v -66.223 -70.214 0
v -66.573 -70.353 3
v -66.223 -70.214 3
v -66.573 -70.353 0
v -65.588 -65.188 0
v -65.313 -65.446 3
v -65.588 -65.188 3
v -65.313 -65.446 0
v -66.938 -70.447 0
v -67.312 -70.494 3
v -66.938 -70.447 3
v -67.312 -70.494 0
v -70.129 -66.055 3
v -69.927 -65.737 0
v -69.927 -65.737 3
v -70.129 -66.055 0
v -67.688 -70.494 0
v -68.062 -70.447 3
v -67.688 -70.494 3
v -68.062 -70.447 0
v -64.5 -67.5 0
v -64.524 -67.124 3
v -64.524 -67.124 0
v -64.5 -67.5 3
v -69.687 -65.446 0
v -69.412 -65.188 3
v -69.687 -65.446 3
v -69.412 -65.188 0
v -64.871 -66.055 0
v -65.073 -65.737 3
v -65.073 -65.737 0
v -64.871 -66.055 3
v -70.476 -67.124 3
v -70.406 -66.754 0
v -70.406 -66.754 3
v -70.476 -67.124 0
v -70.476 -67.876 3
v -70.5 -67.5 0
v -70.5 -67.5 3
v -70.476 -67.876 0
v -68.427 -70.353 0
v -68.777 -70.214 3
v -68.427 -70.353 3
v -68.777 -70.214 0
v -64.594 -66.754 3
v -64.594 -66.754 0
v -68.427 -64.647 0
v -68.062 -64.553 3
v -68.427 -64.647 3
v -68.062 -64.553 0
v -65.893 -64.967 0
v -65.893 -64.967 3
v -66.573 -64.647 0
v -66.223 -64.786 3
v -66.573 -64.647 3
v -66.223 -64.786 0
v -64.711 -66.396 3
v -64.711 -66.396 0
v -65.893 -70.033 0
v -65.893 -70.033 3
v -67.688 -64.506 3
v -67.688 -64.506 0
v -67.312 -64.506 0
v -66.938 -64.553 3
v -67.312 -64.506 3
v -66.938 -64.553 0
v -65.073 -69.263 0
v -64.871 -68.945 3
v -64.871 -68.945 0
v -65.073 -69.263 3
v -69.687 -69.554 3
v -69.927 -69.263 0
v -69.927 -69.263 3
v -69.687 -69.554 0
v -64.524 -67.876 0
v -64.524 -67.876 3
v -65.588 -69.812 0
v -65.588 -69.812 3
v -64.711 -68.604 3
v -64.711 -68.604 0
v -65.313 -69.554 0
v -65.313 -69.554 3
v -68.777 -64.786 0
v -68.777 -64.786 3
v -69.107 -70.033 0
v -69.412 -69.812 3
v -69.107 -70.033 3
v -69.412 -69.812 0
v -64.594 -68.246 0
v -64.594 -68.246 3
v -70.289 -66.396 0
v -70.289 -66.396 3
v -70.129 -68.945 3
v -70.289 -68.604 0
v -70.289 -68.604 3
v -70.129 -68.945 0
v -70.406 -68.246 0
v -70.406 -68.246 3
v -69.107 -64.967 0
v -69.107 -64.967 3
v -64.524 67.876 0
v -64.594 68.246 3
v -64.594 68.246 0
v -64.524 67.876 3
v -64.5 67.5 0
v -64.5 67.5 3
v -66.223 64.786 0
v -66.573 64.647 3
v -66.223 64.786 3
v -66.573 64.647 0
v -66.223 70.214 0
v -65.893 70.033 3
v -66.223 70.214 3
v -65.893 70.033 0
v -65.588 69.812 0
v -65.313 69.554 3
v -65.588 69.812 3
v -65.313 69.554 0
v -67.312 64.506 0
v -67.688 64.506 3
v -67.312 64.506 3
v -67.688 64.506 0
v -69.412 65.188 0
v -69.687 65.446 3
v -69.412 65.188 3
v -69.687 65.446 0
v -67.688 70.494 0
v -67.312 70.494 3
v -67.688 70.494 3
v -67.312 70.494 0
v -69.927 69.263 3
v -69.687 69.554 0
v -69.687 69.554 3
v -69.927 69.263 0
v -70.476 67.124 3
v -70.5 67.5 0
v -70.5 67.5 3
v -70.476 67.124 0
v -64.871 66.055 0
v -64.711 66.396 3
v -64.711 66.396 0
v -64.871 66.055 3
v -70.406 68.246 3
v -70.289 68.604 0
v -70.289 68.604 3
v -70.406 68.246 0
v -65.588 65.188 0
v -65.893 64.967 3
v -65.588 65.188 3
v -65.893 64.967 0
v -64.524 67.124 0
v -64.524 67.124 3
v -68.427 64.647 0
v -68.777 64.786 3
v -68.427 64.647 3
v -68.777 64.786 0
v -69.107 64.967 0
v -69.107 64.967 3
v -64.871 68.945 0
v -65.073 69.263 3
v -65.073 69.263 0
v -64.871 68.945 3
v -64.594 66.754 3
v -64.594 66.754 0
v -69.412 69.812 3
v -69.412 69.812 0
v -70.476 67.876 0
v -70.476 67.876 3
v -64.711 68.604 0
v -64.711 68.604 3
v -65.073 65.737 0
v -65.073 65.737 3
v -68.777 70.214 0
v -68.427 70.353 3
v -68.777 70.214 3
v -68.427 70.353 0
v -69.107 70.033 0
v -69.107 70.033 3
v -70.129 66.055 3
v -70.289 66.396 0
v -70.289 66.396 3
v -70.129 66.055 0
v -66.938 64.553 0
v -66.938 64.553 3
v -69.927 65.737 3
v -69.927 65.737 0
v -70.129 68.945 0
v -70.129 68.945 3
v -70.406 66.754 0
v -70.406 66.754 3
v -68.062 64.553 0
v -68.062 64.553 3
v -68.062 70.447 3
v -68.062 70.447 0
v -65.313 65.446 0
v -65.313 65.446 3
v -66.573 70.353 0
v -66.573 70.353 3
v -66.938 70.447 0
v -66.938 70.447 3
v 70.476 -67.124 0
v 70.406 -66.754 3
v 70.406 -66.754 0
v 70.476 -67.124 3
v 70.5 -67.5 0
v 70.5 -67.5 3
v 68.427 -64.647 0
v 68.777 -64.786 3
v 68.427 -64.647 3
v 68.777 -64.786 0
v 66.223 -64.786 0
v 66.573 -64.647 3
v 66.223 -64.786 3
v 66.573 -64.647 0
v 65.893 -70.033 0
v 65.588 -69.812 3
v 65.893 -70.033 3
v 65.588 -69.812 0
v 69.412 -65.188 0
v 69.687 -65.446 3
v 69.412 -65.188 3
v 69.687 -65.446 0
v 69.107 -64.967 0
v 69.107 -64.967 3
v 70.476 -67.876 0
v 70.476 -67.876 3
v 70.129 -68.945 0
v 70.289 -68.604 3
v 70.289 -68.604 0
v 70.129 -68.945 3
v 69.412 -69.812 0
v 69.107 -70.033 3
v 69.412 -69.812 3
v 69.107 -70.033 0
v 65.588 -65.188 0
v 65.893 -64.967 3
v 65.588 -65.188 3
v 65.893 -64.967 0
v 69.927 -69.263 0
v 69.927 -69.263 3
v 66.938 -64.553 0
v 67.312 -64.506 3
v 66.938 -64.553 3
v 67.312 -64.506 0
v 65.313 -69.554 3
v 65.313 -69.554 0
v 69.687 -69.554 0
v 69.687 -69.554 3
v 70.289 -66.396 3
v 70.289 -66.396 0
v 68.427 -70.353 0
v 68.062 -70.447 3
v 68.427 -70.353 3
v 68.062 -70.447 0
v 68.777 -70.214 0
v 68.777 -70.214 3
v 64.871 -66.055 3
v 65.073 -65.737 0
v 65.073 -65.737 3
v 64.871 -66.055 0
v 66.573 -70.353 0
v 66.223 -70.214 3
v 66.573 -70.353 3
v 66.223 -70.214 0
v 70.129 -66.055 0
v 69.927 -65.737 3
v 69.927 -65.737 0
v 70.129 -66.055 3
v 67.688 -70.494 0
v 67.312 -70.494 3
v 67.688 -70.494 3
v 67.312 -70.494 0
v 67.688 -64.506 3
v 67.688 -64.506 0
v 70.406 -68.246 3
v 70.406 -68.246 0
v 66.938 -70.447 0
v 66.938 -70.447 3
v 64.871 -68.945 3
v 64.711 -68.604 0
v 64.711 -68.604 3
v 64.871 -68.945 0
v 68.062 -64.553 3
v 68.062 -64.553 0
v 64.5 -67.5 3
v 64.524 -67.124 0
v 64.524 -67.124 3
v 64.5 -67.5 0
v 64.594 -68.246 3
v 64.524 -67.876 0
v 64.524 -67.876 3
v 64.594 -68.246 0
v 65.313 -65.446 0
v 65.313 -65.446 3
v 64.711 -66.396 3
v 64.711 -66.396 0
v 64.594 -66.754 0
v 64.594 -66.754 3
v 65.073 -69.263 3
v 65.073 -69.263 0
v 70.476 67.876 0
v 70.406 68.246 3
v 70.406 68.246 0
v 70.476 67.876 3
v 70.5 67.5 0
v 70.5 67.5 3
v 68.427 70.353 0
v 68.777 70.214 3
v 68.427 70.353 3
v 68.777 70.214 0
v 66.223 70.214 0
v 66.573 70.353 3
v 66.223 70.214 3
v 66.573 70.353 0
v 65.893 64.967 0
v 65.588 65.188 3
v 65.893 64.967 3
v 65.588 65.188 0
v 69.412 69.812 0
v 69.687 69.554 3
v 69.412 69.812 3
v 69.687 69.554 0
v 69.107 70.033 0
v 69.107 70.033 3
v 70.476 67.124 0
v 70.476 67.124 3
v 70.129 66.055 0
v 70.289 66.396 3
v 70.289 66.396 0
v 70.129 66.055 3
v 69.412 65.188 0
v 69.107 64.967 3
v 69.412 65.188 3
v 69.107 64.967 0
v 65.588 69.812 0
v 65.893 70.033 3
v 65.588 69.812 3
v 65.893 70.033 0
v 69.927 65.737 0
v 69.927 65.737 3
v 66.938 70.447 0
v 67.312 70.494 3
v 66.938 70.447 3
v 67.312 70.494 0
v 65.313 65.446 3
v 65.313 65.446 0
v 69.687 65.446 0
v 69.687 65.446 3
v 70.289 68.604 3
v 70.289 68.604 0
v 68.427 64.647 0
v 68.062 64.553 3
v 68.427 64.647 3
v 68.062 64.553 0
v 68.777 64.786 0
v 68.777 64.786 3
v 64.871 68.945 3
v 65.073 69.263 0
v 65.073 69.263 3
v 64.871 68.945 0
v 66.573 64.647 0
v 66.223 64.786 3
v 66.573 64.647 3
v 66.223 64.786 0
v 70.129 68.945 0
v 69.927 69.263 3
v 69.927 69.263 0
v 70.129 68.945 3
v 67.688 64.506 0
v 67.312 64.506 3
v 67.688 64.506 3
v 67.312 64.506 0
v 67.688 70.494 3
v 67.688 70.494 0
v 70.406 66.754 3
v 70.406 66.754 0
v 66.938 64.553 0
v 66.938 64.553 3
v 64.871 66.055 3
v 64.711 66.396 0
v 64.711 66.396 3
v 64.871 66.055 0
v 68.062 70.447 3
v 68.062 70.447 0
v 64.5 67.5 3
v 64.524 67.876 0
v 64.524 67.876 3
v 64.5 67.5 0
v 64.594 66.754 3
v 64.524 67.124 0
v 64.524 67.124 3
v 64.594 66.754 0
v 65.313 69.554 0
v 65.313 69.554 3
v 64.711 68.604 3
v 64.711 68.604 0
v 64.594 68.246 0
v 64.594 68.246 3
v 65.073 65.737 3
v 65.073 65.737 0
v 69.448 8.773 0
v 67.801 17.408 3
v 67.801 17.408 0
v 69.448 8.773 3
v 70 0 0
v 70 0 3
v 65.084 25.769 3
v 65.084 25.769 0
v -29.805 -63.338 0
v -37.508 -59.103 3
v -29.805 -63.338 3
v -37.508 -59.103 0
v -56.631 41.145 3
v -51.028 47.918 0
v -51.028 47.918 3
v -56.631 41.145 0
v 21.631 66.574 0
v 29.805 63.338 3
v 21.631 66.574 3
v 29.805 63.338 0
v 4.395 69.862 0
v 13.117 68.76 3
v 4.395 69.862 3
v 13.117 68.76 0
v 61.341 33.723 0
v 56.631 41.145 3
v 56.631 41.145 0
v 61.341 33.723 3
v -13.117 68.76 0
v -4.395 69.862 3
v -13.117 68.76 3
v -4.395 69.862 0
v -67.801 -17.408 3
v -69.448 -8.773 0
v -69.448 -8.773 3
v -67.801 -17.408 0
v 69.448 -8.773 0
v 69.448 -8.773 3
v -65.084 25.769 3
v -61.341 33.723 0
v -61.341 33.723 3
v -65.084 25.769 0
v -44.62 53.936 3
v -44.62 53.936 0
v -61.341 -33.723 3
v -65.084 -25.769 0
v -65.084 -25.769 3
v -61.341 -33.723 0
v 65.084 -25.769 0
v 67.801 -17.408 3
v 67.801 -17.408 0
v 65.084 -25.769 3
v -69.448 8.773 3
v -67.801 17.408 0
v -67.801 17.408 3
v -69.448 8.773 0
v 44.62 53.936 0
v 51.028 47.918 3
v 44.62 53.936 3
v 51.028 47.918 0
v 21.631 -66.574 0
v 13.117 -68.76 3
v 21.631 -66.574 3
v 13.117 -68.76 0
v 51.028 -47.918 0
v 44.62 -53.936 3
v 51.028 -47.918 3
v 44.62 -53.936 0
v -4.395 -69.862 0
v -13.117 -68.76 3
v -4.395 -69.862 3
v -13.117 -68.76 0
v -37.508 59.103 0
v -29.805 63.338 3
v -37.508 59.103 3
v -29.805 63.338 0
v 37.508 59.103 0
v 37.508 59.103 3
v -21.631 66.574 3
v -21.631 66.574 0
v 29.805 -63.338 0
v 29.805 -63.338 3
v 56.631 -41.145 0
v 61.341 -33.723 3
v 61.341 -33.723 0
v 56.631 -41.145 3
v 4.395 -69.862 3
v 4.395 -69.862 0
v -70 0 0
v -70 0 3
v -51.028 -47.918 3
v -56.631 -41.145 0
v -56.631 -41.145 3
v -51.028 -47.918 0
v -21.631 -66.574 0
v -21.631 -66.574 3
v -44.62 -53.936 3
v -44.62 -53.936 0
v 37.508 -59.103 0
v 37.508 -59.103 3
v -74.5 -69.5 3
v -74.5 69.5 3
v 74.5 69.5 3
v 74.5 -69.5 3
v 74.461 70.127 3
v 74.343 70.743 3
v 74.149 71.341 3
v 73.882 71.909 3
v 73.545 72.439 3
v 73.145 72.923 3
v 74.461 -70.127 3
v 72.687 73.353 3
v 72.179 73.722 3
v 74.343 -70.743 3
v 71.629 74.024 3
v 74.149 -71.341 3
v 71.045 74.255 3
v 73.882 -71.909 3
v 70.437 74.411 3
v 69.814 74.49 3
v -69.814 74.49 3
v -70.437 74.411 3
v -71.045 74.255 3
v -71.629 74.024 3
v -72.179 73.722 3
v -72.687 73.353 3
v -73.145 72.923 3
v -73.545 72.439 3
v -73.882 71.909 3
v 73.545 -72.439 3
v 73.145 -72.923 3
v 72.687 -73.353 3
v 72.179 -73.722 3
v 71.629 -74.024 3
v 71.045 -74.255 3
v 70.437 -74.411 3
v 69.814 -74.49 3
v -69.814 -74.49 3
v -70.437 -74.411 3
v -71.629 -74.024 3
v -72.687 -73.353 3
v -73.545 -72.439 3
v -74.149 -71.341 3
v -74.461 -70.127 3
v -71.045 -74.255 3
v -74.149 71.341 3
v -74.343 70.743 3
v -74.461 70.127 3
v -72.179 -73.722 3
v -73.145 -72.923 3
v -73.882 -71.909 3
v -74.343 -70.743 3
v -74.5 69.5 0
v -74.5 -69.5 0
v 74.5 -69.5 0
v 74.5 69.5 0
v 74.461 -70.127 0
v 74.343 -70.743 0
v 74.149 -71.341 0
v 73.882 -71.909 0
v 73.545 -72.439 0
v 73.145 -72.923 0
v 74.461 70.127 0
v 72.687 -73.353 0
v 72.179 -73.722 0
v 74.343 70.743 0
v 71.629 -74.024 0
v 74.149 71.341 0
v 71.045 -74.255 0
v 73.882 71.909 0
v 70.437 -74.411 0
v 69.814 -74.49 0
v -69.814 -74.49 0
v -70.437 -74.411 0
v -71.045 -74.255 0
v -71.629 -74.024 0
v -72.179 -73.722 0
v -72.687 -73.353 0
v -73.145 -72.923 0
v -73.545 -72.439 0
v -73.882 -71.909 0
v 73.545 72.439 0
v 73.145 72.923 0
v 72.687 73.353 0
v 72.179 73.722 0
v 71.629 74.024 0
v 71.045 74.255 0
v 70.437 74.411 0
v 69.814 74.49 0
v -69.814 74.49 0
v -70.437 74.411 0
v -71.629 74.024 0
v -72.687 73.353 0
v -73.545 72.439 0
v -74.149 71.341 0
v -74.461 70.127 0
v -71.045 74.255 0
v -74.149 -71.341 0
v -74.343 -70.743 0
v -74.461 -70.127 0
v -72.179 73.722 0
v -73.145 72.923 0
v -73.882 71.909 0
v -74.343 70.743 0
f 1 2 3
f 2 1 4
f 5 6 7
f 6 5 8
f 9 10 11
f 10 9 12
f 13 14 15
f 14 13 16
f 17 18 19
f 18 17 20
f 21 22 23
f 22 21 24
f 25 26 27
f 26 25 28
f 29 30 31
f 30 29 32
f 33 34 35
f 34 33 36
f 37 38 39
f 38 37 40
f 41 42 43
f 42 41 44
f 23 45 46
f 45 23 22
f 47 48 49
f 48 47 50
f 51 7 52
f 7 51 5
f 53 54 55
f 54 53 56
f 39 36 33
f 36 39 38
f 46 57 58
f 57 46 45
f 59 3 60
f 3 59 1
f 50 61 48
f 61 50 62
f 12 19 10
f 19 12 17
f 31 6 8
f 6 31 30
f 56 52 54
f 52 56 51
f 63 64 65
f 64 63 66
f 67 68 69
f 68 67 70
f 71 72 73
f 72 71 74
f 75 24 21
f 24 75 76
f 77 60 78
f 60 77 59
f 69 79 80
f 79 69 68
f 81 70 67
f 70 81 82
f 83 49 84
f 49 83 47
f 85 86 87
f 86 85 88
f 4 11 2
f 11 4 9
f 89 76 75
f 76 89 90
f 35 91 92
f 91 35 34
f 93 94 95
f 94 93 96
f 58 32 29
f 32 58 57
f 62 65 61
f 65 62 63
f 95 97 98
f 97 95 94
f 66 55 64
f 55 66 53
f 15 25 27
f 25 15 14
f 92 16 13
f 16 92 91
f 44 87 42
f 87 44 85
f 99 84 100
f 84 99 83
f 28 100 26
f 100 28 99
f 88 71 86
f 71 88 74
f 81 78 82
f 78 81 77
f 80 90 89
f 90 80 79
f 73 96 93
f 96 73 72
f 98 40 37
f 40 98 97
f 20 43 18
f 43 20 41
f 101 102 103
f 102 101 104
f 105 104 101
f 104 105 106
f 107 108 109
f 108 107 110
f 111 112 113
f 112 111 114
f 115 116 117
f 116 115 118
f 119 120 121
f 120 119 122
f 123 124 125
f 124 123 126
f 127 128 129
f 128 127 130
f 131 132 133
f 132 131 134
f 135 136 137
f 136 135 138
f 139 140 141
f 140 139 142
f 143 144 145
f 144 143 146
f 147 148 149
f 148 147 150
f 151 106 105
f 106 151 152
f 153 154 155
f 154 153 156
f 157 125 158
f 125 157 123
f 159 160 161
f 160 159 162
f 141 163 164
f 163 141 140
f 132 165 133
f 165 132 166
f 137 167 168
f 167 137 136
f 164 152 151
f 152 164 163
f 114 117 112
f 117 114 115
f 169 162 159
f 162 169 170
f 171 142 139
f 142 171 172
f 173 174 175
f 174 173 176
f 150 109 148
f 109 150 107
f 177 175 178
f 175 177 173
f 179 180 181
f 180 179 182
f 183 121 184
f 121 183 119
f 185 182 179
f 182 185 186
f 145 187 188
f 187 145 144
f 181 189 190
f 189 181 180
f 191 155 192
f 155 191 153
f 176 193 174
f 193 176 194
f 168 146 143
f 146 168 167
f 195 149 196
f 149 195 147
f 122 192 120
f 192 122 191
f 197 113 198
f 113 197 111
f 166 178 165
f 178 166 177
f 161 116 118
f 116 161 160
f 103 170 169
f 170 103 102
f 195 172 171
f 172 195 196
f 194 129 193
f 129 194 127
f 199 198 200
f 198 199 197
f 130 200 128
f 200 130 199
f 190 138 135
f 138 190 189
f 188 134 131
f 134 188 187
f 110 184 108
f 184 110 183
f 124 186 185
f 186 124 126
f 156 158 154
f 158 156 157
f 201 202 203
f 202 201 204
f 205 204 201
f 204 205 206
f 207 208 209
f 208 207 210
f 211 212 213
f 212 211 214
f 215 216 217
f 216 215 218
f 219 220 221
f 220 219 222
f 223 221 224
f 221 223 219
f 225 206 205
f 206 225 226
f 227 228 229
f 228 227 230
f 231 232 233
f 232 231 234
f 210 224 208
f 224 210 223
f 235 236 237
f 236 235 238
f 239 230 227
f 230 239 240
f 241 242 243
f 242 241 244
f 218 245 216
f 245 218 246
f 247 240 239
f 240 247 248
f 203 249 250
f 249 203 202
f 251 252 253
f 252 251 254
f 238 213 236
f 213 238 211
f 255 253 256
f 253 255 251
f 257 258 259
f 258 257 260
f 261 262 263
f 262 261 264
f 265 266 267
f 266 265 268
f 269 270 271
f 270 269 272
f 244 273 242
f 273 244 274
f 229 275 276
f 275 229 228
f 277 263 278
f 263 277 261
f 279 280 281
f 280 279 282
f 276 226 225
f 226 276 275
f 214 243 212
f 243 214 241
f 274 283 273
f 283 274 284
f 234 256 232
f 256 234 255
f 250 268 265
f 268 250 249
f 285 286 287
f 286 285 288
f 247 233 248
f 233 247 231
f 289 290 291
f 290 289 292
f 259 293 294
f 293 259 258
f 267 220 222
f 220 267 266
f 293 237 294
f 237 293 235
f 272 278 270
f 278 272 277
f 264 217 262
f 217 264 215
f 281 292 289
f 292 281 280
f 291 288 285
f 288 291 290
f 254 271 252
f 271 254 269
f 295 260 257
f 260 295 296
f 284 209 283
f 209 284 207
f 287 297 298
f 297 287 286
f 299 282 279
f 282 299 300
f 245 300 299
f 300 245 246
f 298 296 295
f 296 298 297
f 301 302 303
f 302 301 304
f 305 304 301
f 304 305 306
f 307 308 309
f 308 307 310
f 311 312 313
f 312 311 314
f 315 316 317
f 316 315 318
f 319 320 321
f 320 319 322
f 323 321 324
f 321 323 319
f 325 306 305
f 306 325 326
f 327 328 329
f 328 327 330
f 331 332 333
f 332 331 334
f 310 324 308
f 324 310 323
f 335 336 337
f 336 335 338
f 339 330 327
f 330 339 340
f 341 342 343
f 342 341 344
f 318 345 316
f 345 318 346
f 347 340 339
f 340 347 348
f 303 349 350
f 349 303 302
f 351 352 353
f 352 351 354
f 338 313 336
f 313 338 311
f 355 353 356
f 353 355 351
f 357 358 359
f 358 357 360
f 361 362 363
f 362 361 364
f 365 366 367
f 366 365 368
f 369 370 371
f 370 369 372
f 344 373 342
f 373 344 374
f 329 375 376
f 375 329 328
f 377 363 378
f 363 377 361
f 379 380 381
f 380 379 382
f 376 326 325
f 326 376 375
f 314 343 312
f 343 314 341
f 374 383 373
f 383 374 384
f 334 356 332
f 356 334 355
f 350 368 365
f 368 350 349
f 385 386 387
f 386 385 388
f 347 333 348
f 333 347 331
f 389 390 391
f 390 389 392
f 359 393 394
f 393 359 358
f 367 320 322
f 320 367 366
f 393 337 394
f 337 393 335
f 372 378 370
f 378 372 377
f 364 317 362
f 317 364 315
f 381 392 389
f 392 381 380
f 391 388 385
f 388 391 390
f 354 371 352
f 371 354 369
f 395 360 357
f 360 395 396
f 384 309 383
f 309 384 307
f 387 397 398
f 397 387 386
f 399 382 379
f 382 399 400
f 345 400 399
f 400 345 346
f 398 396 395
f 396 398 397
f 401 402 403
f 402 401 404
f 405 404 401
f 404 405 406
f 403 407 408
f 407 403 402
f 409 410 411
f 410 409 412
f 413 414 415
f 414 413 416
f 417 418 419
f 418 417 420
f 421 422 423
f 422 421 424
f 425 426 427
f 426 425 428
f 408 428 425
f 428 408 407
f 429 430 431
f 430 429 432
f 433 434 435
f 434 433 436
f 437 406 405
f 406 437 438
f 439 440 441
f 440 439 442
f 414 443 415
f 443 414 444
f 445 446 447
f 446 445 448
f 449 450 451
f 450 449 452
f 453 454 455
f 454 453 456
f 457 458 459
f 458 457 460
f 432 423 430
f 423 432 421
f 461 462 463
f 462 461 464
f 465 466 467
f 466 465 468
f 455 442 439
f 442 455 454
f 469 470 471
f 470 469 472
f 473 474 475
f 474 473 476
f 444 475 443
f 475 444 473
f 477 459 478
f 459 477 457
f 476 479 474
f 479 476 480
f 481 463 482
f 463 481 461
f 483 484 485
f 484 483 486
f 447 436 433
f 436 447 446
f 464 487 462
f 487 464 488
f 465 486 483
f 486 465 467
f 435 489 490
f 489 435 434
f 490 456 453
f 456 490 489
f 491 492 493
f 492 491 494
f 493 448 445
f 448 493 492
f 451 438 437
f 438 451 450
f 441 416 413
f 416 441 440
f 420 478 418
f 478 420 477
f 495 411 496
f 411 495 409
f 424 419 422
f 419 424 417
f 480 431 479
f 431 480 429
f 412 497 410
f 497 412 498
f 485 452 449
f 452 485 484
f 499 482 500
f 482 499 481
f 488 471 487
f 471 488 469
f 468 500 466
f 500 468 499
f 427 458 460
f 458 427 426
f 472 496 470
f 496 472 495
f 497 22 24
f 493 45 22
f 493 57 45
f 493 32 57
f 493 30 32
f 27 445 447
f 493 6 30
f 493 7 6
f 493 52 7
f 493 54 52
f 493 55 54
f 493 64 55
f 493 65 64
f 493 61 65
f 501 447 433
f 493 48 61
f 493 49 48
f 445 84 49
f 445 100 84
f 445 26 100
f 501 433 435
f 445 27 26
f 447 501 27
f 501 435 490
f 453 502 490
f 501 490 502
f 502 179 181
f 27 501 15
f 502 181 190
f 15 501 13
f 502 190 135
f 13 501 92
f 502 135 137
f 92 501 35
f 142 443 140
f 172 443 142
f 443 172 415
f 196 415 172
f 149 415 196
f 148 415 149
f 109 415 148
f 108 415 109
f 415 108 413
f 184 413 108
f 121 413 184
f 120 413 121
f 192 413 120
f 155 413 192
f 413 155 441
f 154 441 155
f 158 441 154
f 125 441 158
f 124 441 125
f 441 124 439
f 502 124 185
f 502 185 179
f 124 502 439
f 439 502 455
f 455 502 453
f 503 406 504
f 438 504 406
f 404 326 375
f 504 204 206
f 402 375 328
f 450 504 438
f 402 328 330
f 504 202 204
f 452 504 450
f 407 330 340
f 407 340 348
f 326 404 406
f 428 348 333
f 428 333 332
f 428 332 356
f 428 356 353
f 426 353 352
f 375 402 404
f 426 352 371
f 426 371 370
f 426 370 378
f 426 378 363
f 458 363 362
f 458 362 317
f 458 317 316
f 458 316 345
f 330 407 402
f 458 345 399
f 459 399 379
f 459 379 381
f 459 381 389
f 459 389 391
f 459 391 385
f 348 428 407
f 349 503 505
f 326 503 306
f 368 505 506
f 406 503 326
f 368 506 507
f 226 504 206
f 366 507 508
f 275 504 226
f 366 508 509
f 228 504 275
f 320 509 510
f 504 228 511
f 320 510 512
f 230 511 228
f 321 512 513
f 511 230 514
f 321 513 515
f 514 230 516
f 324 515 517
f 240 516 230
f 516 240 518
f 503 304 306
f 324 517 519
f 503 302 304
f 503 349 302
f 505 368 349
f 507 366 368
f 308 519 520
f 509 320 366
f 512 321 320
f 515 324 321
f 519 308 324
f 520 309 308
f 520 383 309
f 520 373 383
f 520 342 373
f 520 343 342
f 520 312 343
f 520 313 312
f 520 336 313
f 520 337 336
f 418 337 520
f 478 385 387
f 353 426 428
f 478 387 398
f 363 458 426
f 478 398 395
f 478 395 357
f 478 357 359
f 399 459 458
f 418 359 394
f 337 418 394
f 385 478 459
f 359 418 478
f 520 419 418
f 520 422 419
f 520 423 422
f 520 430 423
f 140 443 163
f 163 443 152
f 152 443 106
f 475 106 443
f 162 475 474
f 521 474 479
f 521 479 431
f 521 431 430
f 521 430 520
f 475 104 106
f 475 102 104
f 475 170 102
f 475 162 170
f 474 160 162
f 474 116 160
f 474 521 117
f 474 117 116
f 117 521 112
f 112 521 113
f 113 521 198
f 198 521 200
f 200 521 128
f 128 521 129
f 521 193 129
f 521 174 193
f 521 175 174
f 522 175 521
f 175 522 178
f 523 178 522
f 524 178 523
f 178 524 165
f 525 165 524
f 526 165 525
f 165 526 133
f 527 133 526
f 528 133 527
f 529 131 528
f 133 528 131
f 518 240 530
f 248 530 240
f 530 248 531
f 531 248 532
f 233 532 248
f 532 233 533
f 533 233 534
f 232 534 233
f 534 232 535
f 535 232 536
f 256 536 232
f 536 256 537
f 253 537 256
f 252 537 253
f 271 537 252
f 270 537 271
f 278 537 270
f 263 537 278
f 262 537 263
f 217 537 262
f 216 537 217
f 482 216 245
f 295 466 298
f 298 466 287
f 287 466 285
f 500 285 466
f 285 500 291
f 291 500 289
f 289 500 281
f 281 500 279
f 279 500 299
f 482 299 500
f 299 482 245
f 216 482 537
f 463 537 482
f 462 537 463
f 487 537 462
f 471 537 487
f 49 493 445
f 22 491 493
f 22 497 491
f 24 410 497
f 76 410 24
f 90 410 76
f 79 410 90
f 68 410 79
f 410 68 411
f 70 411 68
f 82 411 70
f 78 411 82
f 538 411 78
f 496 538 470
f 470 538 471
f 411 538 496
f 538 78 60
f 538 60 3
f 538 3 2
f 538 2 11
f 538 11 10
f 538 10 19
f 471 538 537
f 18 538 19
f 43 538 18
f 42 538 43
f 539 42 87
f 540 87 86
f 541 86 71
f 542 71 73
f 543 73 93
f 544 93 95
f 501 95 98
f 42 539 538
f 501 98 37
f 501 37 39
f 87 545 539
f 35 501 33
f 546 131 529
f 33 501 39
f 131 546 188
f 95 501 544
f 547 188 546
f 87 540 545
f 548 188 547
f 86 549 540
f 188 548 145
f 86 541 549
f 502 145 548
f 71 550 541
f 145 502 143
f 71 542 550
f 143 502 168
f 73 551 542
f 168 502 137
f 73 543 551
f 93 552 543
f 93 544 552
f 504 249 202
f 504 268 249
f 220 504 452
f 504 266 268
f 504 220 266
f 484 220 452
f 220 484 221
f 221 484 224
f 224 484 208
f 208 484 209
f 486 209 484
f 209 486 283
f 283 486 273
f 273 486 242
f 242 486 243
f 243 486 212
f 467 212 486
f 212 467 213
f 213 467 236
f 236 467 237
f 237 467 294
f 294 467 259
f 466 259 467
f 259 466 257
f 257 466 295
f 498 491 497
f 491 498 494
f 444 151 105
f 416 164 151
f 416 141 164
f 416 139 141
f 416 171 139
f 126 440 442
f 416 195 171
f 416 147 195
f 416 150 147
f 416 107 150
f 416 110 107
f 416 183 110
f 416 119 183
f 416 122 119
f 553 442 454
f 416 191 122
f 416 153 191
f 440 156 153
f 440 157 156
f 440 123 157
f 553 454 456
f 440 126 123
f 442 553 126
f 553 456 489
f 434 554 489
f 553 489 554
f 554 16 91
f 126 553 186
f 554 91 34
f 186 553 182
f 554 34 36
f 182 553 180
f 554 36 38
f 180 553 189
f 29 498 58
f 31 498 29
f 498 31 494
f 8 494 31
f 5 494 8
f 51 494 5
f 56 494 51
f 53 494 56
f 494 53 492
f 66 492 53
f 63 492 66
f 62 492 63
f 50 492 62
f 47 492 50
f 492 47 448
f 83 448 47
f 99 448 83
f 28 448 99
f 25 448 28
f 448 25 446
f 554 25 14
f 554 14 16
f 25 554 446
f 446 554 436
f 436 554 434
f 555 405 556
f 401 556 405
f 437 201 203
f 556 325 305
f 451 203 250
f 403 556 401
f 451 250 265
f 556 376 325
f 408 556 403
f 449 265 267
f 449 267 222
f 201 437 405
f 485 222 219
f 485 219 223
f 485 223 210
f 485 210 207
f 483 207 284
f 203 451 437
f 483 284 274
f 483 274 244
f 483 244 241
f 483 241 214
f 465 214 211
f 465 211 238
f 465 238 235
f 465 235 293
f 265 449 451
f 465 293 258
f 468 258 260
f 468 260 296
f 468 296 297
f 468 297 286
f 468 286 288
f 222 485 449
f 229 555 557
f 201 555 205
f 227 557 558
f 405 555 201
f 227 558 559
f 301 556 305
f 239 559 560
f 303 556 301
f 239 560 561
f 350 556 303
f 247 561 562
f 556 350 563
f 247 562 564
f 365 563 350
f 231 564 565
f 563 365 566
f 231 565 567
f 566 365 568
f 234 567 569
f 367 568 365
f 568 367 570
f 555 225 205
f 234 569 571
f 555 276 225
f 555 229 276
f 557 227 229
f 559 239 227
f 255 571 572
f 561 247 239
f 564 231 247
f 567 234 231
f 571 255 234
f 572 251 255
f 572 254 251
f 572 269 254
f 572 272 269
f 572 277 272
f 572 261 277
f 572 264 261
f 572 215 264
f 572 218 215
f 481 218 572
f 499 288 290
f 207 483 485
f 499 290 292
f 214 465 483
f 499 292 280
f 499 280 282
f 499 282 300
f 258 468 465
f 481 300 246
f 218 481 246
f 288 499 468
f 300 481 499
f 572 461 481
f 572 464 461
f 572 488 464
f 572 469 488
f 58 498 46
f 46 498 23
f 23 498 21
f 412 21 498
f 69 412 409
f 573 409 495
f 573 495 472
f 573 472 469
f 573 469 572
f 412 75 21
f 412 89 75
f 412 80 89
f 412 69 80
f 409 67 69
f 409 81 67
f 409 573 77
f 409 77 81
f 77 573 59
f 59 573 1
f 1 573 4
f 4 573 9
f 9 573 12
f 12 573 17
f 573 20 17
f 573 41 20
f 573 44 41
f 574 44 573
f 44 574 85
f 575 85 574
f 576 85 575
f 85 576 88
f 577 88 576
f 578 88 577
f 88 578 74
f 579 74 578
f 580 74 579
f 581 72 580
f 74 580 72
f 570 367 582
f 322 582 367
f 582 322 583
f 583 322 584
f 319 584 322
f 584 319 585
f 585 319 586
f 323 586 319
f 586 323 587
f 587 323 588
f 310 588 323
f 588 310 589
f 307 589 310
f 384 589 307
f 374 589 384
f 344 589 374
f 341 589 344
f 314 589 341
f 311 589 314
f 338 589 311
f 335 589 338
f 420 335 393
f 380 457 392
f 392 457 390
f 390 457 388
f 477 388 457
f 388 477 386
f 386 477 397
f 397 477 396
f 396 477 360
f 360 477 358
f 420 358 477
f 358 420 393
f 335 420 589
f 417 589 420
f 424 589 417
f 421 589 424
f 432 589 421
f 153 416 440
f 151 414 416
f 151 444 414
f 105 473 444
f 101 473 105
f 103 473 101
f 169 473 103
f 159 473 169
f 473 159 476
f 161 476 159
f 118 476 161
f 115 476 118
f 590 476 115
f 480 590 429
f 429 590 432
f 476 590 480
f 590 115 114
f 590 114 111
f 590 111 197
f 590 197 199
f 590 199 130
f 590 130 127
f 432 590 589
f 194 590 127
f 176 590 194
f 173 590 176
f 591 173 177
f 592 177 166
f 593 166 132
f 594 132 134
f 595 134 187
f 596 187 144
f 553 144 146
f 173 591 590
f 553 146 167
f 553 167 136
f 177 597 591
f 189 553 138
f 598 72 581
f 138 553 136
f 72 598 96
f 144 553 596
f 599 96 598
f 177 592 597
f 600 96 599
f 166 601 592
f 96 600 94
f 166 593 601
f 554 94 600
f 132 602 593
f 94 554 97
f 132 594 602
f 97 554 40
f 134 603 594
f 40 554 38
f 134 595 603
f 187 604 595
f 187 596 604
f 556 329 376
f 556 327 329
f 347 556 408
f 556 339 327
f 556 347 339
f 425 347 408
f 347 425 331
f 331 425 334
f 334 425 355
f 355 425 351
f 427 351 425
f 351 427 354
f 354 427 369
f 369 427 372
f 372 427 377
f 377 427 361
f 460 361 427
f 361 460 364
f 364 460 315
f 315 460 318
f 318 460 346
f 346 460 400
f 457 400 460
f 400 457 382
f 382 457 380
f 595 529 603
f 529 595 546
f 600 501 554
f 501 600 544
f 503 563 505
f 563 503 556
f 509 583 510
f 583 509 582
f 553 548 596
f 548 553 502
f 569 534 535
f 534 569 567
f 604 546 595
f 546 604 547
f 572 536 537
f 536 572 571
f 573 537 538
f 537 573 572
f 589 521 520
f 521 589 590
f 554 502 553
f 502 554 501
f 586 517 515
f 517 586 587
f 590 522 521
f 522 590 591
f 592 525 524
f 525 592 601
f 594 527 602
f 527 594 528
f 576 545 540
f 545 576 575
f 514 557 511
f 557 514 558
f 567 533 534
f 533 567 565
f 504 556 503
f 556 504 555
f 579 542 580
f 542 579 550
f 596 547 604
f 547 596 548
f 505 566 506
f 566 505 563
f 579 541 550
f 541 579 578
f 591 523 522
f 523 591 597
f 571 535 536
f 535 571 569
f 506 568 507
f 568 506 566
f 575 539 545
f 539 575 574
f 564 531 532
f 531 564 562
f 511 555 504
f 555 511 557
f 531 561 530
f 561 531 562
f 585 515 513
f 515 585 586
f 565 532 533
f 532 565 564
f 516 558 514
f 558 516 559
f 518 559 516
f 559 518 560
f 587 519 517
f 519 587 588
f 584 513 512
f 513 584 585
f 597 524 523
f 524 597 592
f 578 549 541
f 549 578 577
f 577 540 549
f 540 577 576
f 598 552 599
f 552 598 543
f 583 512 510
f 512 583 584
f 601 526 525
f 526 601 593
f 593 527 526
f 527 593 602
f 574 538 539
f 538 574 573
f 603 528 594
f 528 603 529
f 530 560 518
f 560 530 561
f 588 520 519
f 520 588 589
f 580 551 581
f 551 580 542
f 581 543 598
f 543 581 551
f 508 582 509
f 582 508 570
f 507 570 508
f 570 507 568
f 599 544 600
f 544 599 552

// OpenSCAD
$fn = 50;


difference() {
	union() {
		hull() {
			translate(v = [-69.5000000000, 69.5000000000, 0]) {
				cylinder(h = 3, r = 5);
			}
			translate(v = [69.5000000000, 69.5000000000, 0]) {
				cylinder(h = 3, r = 5);
			}
			translate(v = [-69.5000000000, -69.5000000000, 0]) {
				cylinder(h = 3, r = 5);
			}
			translate(v = [69.5000000000, -69.5000000000, 0]) {
				cylinder(h = 3, r = 5);
			}
		}
	}
	union() {
		#translate(v = [-67.5000000000, -67.5000000000, -100.0000000000]) {
			cylinder(h = 200, r = 3.0000000000);
		}
		#translate(v = [-67.5000000000, 67.5000000000, -100.0000000000]) {
			cylinder(h = 200, r = 3.0000000000);
		}
		#translate(v = [67.5000000000, -67.5000000000, -100.0000000000]) {
			cylinder(h = 200, r = 3.0000000000);
		}
		#translate(v = [67.5000000000, 67.5000000000, -100.0000000000]) {
			cylinder(h = 200, r = 3.0000000000);
		}
		#cylinder(h = 3, r = 70.0000000000);
	}
}
